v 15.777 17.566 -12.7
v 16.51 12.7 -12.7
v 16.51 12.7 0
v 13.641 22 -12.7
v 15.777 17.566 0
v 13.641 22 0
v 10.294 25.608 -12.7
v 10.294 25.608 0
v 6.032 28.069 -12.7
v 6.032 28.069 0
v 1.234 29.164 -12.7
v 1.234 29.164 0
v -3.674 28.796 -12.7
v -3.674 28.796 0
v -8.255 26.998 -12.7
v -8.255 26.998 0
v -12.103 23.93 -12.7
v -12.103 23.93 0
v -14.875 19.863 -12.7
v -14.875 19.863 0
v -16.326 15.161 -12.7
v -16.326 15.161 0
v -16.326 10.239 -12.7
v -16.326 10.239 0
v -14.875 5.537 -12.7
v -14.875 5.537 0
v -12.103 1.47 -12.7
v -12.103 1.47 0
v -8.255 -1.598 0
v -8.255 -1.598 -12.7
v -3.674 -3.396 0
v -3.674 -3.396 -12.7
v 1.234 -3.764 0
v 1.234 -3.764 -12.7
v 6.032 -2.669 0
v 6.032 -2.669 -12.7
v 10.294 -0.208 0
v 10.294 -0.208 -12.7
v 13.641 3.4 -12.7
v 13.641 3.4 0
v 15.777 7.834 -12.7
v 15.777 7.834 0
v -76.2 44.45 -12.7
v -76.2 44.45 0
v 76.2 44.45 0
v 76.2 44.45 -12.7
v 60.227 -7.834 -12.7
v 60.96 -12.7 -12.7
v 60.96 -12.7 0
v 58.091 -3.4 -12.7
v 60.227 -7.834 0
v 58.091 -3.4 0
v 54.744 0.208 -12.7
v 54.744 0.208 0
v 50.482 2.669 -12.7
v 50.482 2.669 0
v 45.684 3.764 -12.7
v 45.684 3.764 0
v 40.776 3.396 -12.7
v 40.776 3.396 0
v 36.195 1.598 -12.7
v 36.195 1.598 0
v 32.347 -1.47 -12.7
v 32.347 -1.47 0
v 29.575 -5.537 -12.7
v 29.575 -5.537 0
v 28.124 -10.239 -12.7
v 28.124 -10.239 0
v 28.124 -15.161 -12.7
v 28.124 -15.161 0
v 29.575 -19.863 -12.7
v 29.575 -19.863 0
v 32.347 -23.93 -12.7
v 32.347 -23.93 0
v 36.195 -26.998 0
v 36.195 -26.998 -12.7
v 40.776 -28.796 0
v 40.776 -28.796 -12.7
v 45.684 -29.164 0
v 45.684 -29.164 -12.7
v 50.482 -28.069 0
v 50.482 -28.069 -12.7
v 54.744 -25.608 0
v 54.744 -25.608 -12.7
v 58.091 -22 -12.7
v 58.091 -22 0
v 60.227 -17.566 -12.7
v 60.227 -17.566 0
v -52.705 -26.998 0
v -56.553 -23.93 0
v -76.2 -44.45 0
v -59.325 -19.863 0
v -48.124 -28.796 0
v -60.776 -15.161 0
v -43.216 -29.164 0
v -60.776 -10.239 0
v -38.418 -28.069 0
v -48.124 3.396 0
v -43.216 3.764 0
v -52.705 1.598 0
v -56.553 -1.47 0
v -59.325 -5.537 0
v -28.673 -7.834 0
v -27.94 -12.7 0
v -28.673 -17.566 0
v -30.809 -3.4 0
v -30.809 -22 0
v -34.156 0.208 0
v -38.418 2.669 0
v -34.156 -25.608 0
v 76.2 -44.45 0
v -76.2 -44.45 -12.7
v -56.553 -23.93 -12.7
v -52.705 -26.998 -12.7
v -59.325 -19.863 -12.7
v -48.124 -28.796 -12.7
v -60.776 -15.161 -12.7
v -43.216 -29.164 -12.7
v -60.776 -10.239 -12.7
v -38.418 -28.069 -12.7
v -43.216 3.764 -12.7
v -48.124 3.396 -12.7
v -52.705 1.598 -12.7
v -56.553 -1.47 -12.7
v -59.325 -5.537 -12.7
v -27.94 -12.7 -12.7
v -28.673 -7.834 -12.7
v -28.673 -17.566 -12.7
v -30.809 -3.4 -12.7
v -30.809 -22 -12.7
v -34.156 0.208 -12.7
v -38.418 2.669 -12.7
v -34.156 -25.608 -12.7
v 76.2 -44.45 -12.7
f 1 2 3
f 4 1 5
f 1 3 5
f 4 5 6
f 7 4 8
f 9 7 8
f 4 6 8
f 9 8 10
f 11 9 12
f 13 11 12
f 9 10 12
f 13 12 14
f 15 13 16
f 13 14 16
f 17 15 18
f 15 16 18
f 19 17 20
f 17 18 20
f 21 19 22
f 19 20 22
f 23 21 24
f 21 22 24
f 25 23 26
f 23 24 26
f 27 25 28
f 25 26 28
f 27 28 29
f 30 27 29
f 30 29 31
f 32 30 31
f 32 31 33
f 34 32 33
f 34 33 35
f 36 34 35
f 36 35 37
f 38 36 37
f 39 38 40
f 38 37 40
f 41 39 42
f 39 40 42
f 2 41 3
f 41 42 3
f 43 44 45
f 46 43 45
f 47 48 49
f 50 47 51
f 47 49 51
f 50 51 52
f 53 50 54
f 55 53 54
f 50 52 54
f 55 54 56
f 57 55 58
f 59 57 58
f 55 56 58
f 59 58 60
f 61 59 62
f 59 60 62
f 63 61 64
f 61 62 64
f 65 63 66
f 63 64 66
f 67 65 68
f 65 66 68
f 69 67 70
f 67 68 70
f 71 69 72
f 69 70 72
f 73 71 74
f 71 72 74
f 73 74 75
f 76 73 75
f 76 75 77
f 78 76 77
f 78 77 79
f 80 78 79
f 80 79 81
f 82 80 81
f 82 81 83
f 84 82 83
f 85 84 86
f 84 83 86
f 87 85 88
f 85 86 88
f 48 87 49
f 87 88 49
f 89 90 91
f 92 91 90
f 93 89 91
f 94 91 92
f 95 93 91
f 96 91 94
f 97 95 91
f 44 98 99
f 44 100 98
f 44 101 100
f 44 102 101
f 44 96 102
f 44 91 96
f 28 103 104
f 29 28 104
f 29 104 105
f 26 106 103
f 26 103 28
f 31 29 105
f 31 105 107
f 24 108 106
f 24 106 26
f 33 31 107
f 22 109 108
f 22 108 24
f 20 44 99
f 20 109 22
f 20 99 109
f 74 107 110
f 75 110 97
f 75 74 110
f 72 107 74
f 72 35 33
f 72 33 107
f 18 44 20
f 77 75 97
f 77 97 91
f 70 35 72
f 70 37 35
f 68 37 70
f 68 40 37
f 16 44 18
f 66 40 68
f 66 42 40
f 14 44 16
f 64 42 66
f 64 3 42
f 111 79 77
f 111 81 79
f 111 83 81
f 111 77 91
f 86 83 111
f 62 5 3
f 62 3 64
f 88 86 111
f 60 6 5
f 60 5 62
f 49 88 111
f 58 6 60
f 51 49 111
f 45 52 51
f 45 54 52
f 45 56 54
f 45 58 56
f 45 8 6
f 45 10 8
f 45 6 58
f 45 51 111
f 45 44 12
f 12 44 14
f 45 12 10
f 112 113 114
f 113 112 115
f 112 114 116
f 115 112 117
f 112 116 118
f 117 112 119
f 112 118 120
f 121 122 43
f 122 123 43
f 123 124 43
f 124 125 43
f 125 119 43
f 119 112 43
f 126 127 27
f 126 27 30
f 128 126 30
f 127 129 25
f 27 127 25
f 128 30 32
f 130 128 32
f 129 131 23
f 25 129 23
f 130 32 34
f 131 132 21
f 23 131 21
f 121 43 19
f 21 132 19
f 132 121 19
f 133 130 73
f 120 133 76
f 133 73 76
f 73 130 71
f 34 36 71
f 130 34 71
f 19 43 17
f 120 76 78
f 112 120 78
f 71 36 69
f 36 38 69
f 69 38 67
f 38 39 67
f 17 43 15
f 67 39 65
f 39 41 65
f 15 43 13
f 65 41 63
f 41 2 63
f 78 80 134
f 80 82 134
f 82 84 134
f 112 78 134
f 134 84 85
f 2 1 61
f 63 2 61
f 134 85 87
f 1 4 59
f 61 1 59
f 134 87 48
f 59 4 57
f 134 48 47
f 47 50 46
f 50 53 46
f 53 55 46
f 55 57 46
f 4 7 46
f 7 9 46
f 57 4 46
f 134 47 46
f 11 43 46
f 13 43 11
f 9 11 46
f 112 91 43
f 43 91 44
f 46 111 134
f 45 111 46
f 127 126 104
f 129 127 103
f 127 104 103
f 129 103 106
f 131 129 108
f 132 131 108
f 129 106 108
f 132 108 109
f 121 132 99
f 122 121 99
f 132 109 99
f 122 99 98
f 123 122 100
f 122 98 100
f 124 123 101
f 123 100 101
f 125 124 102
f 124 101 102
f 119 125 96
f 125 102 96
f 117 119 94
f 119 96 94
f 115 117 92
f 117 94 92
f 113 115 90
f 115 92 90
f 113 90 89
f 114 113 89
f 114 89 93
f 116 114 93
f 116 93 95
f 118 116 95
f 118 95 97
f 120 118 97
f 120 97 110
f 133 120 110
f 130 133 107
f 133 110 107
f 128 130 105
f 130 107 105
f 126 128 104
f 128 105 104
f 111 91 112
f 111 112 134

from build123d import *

# Parameters (mm, degrees)
F0_W     = 152.4
F0_H     = 88.9
F0_R     = 16.51
F1_DEPTH = 12.7


with BuildPart() as f1:
    # F0 (on Top) → F1 (new body)
    with BuildSketch(Plane.XY):
        Rectangle(F0_W, F0_H)
        with Locations((-44.45, -12.7)):
            Circle(F0_R, mode=Mode.SUBTRACT)
        with Locations((44.45, -12.7)):
            Circle(F0_R, mode=Mode.SUBTRACT)
        with Locations((0, 12.7)):
            Circle(F0_R, mode=Mode.SUBTRACT)
    extrude(amount=-F1_DEPTH)


solid = f1.part
